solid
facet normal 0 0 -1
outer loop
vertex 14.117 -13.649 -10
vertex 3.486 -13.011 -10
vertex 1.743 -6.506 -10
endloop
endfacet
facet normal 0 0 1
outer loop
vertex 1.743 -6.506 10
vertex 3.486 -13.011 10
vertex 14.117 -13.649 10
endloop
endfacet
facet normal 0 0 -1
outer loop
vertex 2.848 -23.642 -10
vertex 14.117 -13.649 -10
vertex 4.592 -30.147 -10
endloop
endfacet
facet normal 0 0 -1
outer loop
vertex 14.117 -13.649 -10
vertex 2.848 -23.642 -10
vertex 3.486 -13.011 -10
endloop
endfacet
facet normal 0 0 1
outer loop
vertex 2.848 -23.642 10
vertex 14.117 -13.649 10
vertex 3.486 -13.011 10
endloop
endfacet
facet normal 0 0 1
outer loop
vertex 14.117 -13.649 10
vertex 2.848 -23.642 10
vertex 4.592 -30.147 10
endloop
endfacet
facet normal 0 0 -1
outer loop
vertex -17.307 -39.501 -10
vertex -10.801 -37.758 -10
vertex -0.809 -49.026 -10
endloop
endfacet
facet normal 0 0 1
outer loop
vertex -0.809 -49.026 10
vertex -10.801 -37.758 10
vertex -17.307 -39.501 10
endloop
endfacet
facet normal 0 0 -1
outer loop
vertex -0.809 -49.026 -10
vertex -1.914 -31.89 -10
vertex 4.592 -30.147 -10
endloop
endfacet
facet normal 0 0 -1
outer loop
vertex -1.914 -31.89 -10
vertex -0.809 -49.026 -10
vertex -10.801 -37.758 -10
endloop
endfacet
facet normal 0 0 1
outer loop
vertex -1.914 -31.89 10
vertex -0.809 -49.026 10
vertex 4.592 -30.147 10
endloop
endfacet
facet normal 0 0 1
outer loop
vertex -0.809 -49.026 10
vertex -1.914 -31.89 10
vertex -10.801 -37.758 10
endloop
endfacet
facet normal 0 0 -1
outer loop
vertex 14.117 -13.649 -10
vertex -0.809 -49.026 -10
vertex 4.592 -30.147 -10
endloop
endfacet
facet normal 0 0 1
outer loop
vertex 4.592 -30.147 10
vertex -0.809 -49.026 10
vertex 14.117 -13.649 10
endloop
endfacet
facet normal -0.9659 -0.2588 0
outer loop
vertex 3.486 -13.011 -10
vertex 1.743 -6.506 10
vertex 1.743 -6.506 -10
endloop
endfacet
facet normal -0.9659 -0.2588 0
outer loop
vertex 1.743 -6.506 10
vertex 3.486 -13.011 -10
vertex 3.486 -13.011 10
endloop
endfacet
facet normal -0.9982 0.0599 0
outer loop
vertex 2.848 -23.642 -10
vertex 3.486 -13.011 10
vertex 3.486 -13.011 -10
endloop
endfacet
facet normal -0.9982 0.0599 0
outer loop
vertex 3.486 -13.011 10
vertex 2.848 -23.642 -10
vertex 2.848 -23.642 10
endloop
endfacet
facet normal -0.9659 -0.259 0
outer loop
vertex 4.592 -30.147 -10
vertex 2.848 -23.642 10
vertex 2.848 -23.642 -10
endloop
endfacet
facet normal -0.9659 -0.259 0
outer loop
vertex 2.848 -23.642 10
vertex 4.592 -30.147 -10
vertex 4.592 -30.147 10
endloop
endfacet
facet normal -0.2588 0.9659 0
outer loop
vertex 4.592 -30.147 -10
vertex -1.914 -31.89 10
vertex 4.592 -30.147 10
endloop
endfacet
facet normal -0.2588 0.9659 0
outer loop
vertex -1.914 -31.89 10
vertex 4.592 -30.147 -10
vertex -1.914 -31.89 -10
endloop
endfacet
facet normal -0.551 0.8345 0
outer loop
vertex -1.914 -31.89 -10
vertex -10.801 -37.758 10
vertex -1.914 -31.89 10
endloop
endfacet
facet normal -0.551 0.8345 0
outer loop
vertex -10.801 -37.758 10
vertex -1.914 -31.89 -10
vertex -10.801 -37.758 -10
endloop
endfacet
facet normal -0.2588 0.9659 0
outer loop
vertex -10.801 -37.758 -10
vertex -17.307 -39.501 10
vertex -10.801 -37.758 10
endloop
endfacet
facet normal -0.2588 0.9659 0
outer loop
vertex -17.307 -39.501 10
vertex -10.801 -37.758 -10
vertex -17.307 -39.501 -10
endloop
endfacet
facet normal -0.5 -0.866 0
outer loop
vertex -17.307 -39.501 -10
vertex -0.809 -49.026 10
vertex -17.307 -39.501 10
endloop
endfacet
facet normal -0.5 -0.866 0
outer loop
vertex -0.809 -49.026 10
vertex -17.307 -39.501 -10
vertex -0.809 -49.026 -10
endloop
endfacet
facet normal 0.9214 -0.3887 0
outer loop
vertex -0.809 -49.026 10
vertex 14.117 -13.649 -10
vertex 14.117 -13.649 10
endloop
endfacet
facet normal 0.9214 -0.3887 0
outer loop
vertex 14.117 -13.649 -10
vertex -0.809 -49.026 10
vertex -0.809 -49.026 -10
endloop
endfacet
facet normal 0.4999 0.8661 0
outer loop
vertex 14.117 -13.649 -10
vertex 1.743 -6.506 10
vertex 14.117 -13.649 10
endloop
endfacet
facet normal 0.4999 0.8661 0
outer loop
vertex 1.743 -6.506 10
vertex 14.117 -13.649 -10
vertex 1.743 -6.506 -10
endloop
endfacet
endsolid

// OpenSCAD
polyhedron(
    points=[
    [1.74319598552339, -6.50569598552339, -10],
    [3.48639197104678, -13.0113919710468, -10],
    [2.84833795657017, -23.6415339420936, -10],
    [4.59153394209356, -30.1472299276169, -10],
    [-1.91416204342983, -31.8904259131403, -10],
    [-10.8011080289532, -37.7580678841871, -10],
    [-17.3068040144766, -39.5012638697105, -10],
    [-0.809020072383049, -49.0262638697105, -10],
    [14.1165339420936, -13.6494459855234, -10],
    [1.74319598552339, -6.50569598552339, 10],
    [3.48639197104678, -13.0113919710468, 10],
    [2.84833795657017, -23.6415339420936, 10],
    [4.59153394209356, -30.1472299276169, 10],
    [-1.91416204342983, -31.8904259131403, 10],
    [-10.8011080289532, -37.7580678841871, 10],
    [-17.3068040144766, -39.5012638697105, 10],
    [-0.809020072383049, -49.0262638697105, 10],
    [14.1165339420936, -13.6494459855234, 10],
    ],
    faces=[
        [0,1,8],
        [17,10,9],
        [1,2,3,8],
        [17,12,11,10],
        [7,5,6],
        [15,14,16],
        [7,3,4,5],
        [14,13,12,16],
        [3,7,8],
        [17,16,12],
        [0,9,10,1],
        [1,10,11,2],
        [2,11,12,3],
        [3,12,13,4],
        [4,13,14,5],
        [5,14,15,6],
        [6,15,16,7],
        [7,16,17,8],
        [8,17,9,0],
    ]
);
